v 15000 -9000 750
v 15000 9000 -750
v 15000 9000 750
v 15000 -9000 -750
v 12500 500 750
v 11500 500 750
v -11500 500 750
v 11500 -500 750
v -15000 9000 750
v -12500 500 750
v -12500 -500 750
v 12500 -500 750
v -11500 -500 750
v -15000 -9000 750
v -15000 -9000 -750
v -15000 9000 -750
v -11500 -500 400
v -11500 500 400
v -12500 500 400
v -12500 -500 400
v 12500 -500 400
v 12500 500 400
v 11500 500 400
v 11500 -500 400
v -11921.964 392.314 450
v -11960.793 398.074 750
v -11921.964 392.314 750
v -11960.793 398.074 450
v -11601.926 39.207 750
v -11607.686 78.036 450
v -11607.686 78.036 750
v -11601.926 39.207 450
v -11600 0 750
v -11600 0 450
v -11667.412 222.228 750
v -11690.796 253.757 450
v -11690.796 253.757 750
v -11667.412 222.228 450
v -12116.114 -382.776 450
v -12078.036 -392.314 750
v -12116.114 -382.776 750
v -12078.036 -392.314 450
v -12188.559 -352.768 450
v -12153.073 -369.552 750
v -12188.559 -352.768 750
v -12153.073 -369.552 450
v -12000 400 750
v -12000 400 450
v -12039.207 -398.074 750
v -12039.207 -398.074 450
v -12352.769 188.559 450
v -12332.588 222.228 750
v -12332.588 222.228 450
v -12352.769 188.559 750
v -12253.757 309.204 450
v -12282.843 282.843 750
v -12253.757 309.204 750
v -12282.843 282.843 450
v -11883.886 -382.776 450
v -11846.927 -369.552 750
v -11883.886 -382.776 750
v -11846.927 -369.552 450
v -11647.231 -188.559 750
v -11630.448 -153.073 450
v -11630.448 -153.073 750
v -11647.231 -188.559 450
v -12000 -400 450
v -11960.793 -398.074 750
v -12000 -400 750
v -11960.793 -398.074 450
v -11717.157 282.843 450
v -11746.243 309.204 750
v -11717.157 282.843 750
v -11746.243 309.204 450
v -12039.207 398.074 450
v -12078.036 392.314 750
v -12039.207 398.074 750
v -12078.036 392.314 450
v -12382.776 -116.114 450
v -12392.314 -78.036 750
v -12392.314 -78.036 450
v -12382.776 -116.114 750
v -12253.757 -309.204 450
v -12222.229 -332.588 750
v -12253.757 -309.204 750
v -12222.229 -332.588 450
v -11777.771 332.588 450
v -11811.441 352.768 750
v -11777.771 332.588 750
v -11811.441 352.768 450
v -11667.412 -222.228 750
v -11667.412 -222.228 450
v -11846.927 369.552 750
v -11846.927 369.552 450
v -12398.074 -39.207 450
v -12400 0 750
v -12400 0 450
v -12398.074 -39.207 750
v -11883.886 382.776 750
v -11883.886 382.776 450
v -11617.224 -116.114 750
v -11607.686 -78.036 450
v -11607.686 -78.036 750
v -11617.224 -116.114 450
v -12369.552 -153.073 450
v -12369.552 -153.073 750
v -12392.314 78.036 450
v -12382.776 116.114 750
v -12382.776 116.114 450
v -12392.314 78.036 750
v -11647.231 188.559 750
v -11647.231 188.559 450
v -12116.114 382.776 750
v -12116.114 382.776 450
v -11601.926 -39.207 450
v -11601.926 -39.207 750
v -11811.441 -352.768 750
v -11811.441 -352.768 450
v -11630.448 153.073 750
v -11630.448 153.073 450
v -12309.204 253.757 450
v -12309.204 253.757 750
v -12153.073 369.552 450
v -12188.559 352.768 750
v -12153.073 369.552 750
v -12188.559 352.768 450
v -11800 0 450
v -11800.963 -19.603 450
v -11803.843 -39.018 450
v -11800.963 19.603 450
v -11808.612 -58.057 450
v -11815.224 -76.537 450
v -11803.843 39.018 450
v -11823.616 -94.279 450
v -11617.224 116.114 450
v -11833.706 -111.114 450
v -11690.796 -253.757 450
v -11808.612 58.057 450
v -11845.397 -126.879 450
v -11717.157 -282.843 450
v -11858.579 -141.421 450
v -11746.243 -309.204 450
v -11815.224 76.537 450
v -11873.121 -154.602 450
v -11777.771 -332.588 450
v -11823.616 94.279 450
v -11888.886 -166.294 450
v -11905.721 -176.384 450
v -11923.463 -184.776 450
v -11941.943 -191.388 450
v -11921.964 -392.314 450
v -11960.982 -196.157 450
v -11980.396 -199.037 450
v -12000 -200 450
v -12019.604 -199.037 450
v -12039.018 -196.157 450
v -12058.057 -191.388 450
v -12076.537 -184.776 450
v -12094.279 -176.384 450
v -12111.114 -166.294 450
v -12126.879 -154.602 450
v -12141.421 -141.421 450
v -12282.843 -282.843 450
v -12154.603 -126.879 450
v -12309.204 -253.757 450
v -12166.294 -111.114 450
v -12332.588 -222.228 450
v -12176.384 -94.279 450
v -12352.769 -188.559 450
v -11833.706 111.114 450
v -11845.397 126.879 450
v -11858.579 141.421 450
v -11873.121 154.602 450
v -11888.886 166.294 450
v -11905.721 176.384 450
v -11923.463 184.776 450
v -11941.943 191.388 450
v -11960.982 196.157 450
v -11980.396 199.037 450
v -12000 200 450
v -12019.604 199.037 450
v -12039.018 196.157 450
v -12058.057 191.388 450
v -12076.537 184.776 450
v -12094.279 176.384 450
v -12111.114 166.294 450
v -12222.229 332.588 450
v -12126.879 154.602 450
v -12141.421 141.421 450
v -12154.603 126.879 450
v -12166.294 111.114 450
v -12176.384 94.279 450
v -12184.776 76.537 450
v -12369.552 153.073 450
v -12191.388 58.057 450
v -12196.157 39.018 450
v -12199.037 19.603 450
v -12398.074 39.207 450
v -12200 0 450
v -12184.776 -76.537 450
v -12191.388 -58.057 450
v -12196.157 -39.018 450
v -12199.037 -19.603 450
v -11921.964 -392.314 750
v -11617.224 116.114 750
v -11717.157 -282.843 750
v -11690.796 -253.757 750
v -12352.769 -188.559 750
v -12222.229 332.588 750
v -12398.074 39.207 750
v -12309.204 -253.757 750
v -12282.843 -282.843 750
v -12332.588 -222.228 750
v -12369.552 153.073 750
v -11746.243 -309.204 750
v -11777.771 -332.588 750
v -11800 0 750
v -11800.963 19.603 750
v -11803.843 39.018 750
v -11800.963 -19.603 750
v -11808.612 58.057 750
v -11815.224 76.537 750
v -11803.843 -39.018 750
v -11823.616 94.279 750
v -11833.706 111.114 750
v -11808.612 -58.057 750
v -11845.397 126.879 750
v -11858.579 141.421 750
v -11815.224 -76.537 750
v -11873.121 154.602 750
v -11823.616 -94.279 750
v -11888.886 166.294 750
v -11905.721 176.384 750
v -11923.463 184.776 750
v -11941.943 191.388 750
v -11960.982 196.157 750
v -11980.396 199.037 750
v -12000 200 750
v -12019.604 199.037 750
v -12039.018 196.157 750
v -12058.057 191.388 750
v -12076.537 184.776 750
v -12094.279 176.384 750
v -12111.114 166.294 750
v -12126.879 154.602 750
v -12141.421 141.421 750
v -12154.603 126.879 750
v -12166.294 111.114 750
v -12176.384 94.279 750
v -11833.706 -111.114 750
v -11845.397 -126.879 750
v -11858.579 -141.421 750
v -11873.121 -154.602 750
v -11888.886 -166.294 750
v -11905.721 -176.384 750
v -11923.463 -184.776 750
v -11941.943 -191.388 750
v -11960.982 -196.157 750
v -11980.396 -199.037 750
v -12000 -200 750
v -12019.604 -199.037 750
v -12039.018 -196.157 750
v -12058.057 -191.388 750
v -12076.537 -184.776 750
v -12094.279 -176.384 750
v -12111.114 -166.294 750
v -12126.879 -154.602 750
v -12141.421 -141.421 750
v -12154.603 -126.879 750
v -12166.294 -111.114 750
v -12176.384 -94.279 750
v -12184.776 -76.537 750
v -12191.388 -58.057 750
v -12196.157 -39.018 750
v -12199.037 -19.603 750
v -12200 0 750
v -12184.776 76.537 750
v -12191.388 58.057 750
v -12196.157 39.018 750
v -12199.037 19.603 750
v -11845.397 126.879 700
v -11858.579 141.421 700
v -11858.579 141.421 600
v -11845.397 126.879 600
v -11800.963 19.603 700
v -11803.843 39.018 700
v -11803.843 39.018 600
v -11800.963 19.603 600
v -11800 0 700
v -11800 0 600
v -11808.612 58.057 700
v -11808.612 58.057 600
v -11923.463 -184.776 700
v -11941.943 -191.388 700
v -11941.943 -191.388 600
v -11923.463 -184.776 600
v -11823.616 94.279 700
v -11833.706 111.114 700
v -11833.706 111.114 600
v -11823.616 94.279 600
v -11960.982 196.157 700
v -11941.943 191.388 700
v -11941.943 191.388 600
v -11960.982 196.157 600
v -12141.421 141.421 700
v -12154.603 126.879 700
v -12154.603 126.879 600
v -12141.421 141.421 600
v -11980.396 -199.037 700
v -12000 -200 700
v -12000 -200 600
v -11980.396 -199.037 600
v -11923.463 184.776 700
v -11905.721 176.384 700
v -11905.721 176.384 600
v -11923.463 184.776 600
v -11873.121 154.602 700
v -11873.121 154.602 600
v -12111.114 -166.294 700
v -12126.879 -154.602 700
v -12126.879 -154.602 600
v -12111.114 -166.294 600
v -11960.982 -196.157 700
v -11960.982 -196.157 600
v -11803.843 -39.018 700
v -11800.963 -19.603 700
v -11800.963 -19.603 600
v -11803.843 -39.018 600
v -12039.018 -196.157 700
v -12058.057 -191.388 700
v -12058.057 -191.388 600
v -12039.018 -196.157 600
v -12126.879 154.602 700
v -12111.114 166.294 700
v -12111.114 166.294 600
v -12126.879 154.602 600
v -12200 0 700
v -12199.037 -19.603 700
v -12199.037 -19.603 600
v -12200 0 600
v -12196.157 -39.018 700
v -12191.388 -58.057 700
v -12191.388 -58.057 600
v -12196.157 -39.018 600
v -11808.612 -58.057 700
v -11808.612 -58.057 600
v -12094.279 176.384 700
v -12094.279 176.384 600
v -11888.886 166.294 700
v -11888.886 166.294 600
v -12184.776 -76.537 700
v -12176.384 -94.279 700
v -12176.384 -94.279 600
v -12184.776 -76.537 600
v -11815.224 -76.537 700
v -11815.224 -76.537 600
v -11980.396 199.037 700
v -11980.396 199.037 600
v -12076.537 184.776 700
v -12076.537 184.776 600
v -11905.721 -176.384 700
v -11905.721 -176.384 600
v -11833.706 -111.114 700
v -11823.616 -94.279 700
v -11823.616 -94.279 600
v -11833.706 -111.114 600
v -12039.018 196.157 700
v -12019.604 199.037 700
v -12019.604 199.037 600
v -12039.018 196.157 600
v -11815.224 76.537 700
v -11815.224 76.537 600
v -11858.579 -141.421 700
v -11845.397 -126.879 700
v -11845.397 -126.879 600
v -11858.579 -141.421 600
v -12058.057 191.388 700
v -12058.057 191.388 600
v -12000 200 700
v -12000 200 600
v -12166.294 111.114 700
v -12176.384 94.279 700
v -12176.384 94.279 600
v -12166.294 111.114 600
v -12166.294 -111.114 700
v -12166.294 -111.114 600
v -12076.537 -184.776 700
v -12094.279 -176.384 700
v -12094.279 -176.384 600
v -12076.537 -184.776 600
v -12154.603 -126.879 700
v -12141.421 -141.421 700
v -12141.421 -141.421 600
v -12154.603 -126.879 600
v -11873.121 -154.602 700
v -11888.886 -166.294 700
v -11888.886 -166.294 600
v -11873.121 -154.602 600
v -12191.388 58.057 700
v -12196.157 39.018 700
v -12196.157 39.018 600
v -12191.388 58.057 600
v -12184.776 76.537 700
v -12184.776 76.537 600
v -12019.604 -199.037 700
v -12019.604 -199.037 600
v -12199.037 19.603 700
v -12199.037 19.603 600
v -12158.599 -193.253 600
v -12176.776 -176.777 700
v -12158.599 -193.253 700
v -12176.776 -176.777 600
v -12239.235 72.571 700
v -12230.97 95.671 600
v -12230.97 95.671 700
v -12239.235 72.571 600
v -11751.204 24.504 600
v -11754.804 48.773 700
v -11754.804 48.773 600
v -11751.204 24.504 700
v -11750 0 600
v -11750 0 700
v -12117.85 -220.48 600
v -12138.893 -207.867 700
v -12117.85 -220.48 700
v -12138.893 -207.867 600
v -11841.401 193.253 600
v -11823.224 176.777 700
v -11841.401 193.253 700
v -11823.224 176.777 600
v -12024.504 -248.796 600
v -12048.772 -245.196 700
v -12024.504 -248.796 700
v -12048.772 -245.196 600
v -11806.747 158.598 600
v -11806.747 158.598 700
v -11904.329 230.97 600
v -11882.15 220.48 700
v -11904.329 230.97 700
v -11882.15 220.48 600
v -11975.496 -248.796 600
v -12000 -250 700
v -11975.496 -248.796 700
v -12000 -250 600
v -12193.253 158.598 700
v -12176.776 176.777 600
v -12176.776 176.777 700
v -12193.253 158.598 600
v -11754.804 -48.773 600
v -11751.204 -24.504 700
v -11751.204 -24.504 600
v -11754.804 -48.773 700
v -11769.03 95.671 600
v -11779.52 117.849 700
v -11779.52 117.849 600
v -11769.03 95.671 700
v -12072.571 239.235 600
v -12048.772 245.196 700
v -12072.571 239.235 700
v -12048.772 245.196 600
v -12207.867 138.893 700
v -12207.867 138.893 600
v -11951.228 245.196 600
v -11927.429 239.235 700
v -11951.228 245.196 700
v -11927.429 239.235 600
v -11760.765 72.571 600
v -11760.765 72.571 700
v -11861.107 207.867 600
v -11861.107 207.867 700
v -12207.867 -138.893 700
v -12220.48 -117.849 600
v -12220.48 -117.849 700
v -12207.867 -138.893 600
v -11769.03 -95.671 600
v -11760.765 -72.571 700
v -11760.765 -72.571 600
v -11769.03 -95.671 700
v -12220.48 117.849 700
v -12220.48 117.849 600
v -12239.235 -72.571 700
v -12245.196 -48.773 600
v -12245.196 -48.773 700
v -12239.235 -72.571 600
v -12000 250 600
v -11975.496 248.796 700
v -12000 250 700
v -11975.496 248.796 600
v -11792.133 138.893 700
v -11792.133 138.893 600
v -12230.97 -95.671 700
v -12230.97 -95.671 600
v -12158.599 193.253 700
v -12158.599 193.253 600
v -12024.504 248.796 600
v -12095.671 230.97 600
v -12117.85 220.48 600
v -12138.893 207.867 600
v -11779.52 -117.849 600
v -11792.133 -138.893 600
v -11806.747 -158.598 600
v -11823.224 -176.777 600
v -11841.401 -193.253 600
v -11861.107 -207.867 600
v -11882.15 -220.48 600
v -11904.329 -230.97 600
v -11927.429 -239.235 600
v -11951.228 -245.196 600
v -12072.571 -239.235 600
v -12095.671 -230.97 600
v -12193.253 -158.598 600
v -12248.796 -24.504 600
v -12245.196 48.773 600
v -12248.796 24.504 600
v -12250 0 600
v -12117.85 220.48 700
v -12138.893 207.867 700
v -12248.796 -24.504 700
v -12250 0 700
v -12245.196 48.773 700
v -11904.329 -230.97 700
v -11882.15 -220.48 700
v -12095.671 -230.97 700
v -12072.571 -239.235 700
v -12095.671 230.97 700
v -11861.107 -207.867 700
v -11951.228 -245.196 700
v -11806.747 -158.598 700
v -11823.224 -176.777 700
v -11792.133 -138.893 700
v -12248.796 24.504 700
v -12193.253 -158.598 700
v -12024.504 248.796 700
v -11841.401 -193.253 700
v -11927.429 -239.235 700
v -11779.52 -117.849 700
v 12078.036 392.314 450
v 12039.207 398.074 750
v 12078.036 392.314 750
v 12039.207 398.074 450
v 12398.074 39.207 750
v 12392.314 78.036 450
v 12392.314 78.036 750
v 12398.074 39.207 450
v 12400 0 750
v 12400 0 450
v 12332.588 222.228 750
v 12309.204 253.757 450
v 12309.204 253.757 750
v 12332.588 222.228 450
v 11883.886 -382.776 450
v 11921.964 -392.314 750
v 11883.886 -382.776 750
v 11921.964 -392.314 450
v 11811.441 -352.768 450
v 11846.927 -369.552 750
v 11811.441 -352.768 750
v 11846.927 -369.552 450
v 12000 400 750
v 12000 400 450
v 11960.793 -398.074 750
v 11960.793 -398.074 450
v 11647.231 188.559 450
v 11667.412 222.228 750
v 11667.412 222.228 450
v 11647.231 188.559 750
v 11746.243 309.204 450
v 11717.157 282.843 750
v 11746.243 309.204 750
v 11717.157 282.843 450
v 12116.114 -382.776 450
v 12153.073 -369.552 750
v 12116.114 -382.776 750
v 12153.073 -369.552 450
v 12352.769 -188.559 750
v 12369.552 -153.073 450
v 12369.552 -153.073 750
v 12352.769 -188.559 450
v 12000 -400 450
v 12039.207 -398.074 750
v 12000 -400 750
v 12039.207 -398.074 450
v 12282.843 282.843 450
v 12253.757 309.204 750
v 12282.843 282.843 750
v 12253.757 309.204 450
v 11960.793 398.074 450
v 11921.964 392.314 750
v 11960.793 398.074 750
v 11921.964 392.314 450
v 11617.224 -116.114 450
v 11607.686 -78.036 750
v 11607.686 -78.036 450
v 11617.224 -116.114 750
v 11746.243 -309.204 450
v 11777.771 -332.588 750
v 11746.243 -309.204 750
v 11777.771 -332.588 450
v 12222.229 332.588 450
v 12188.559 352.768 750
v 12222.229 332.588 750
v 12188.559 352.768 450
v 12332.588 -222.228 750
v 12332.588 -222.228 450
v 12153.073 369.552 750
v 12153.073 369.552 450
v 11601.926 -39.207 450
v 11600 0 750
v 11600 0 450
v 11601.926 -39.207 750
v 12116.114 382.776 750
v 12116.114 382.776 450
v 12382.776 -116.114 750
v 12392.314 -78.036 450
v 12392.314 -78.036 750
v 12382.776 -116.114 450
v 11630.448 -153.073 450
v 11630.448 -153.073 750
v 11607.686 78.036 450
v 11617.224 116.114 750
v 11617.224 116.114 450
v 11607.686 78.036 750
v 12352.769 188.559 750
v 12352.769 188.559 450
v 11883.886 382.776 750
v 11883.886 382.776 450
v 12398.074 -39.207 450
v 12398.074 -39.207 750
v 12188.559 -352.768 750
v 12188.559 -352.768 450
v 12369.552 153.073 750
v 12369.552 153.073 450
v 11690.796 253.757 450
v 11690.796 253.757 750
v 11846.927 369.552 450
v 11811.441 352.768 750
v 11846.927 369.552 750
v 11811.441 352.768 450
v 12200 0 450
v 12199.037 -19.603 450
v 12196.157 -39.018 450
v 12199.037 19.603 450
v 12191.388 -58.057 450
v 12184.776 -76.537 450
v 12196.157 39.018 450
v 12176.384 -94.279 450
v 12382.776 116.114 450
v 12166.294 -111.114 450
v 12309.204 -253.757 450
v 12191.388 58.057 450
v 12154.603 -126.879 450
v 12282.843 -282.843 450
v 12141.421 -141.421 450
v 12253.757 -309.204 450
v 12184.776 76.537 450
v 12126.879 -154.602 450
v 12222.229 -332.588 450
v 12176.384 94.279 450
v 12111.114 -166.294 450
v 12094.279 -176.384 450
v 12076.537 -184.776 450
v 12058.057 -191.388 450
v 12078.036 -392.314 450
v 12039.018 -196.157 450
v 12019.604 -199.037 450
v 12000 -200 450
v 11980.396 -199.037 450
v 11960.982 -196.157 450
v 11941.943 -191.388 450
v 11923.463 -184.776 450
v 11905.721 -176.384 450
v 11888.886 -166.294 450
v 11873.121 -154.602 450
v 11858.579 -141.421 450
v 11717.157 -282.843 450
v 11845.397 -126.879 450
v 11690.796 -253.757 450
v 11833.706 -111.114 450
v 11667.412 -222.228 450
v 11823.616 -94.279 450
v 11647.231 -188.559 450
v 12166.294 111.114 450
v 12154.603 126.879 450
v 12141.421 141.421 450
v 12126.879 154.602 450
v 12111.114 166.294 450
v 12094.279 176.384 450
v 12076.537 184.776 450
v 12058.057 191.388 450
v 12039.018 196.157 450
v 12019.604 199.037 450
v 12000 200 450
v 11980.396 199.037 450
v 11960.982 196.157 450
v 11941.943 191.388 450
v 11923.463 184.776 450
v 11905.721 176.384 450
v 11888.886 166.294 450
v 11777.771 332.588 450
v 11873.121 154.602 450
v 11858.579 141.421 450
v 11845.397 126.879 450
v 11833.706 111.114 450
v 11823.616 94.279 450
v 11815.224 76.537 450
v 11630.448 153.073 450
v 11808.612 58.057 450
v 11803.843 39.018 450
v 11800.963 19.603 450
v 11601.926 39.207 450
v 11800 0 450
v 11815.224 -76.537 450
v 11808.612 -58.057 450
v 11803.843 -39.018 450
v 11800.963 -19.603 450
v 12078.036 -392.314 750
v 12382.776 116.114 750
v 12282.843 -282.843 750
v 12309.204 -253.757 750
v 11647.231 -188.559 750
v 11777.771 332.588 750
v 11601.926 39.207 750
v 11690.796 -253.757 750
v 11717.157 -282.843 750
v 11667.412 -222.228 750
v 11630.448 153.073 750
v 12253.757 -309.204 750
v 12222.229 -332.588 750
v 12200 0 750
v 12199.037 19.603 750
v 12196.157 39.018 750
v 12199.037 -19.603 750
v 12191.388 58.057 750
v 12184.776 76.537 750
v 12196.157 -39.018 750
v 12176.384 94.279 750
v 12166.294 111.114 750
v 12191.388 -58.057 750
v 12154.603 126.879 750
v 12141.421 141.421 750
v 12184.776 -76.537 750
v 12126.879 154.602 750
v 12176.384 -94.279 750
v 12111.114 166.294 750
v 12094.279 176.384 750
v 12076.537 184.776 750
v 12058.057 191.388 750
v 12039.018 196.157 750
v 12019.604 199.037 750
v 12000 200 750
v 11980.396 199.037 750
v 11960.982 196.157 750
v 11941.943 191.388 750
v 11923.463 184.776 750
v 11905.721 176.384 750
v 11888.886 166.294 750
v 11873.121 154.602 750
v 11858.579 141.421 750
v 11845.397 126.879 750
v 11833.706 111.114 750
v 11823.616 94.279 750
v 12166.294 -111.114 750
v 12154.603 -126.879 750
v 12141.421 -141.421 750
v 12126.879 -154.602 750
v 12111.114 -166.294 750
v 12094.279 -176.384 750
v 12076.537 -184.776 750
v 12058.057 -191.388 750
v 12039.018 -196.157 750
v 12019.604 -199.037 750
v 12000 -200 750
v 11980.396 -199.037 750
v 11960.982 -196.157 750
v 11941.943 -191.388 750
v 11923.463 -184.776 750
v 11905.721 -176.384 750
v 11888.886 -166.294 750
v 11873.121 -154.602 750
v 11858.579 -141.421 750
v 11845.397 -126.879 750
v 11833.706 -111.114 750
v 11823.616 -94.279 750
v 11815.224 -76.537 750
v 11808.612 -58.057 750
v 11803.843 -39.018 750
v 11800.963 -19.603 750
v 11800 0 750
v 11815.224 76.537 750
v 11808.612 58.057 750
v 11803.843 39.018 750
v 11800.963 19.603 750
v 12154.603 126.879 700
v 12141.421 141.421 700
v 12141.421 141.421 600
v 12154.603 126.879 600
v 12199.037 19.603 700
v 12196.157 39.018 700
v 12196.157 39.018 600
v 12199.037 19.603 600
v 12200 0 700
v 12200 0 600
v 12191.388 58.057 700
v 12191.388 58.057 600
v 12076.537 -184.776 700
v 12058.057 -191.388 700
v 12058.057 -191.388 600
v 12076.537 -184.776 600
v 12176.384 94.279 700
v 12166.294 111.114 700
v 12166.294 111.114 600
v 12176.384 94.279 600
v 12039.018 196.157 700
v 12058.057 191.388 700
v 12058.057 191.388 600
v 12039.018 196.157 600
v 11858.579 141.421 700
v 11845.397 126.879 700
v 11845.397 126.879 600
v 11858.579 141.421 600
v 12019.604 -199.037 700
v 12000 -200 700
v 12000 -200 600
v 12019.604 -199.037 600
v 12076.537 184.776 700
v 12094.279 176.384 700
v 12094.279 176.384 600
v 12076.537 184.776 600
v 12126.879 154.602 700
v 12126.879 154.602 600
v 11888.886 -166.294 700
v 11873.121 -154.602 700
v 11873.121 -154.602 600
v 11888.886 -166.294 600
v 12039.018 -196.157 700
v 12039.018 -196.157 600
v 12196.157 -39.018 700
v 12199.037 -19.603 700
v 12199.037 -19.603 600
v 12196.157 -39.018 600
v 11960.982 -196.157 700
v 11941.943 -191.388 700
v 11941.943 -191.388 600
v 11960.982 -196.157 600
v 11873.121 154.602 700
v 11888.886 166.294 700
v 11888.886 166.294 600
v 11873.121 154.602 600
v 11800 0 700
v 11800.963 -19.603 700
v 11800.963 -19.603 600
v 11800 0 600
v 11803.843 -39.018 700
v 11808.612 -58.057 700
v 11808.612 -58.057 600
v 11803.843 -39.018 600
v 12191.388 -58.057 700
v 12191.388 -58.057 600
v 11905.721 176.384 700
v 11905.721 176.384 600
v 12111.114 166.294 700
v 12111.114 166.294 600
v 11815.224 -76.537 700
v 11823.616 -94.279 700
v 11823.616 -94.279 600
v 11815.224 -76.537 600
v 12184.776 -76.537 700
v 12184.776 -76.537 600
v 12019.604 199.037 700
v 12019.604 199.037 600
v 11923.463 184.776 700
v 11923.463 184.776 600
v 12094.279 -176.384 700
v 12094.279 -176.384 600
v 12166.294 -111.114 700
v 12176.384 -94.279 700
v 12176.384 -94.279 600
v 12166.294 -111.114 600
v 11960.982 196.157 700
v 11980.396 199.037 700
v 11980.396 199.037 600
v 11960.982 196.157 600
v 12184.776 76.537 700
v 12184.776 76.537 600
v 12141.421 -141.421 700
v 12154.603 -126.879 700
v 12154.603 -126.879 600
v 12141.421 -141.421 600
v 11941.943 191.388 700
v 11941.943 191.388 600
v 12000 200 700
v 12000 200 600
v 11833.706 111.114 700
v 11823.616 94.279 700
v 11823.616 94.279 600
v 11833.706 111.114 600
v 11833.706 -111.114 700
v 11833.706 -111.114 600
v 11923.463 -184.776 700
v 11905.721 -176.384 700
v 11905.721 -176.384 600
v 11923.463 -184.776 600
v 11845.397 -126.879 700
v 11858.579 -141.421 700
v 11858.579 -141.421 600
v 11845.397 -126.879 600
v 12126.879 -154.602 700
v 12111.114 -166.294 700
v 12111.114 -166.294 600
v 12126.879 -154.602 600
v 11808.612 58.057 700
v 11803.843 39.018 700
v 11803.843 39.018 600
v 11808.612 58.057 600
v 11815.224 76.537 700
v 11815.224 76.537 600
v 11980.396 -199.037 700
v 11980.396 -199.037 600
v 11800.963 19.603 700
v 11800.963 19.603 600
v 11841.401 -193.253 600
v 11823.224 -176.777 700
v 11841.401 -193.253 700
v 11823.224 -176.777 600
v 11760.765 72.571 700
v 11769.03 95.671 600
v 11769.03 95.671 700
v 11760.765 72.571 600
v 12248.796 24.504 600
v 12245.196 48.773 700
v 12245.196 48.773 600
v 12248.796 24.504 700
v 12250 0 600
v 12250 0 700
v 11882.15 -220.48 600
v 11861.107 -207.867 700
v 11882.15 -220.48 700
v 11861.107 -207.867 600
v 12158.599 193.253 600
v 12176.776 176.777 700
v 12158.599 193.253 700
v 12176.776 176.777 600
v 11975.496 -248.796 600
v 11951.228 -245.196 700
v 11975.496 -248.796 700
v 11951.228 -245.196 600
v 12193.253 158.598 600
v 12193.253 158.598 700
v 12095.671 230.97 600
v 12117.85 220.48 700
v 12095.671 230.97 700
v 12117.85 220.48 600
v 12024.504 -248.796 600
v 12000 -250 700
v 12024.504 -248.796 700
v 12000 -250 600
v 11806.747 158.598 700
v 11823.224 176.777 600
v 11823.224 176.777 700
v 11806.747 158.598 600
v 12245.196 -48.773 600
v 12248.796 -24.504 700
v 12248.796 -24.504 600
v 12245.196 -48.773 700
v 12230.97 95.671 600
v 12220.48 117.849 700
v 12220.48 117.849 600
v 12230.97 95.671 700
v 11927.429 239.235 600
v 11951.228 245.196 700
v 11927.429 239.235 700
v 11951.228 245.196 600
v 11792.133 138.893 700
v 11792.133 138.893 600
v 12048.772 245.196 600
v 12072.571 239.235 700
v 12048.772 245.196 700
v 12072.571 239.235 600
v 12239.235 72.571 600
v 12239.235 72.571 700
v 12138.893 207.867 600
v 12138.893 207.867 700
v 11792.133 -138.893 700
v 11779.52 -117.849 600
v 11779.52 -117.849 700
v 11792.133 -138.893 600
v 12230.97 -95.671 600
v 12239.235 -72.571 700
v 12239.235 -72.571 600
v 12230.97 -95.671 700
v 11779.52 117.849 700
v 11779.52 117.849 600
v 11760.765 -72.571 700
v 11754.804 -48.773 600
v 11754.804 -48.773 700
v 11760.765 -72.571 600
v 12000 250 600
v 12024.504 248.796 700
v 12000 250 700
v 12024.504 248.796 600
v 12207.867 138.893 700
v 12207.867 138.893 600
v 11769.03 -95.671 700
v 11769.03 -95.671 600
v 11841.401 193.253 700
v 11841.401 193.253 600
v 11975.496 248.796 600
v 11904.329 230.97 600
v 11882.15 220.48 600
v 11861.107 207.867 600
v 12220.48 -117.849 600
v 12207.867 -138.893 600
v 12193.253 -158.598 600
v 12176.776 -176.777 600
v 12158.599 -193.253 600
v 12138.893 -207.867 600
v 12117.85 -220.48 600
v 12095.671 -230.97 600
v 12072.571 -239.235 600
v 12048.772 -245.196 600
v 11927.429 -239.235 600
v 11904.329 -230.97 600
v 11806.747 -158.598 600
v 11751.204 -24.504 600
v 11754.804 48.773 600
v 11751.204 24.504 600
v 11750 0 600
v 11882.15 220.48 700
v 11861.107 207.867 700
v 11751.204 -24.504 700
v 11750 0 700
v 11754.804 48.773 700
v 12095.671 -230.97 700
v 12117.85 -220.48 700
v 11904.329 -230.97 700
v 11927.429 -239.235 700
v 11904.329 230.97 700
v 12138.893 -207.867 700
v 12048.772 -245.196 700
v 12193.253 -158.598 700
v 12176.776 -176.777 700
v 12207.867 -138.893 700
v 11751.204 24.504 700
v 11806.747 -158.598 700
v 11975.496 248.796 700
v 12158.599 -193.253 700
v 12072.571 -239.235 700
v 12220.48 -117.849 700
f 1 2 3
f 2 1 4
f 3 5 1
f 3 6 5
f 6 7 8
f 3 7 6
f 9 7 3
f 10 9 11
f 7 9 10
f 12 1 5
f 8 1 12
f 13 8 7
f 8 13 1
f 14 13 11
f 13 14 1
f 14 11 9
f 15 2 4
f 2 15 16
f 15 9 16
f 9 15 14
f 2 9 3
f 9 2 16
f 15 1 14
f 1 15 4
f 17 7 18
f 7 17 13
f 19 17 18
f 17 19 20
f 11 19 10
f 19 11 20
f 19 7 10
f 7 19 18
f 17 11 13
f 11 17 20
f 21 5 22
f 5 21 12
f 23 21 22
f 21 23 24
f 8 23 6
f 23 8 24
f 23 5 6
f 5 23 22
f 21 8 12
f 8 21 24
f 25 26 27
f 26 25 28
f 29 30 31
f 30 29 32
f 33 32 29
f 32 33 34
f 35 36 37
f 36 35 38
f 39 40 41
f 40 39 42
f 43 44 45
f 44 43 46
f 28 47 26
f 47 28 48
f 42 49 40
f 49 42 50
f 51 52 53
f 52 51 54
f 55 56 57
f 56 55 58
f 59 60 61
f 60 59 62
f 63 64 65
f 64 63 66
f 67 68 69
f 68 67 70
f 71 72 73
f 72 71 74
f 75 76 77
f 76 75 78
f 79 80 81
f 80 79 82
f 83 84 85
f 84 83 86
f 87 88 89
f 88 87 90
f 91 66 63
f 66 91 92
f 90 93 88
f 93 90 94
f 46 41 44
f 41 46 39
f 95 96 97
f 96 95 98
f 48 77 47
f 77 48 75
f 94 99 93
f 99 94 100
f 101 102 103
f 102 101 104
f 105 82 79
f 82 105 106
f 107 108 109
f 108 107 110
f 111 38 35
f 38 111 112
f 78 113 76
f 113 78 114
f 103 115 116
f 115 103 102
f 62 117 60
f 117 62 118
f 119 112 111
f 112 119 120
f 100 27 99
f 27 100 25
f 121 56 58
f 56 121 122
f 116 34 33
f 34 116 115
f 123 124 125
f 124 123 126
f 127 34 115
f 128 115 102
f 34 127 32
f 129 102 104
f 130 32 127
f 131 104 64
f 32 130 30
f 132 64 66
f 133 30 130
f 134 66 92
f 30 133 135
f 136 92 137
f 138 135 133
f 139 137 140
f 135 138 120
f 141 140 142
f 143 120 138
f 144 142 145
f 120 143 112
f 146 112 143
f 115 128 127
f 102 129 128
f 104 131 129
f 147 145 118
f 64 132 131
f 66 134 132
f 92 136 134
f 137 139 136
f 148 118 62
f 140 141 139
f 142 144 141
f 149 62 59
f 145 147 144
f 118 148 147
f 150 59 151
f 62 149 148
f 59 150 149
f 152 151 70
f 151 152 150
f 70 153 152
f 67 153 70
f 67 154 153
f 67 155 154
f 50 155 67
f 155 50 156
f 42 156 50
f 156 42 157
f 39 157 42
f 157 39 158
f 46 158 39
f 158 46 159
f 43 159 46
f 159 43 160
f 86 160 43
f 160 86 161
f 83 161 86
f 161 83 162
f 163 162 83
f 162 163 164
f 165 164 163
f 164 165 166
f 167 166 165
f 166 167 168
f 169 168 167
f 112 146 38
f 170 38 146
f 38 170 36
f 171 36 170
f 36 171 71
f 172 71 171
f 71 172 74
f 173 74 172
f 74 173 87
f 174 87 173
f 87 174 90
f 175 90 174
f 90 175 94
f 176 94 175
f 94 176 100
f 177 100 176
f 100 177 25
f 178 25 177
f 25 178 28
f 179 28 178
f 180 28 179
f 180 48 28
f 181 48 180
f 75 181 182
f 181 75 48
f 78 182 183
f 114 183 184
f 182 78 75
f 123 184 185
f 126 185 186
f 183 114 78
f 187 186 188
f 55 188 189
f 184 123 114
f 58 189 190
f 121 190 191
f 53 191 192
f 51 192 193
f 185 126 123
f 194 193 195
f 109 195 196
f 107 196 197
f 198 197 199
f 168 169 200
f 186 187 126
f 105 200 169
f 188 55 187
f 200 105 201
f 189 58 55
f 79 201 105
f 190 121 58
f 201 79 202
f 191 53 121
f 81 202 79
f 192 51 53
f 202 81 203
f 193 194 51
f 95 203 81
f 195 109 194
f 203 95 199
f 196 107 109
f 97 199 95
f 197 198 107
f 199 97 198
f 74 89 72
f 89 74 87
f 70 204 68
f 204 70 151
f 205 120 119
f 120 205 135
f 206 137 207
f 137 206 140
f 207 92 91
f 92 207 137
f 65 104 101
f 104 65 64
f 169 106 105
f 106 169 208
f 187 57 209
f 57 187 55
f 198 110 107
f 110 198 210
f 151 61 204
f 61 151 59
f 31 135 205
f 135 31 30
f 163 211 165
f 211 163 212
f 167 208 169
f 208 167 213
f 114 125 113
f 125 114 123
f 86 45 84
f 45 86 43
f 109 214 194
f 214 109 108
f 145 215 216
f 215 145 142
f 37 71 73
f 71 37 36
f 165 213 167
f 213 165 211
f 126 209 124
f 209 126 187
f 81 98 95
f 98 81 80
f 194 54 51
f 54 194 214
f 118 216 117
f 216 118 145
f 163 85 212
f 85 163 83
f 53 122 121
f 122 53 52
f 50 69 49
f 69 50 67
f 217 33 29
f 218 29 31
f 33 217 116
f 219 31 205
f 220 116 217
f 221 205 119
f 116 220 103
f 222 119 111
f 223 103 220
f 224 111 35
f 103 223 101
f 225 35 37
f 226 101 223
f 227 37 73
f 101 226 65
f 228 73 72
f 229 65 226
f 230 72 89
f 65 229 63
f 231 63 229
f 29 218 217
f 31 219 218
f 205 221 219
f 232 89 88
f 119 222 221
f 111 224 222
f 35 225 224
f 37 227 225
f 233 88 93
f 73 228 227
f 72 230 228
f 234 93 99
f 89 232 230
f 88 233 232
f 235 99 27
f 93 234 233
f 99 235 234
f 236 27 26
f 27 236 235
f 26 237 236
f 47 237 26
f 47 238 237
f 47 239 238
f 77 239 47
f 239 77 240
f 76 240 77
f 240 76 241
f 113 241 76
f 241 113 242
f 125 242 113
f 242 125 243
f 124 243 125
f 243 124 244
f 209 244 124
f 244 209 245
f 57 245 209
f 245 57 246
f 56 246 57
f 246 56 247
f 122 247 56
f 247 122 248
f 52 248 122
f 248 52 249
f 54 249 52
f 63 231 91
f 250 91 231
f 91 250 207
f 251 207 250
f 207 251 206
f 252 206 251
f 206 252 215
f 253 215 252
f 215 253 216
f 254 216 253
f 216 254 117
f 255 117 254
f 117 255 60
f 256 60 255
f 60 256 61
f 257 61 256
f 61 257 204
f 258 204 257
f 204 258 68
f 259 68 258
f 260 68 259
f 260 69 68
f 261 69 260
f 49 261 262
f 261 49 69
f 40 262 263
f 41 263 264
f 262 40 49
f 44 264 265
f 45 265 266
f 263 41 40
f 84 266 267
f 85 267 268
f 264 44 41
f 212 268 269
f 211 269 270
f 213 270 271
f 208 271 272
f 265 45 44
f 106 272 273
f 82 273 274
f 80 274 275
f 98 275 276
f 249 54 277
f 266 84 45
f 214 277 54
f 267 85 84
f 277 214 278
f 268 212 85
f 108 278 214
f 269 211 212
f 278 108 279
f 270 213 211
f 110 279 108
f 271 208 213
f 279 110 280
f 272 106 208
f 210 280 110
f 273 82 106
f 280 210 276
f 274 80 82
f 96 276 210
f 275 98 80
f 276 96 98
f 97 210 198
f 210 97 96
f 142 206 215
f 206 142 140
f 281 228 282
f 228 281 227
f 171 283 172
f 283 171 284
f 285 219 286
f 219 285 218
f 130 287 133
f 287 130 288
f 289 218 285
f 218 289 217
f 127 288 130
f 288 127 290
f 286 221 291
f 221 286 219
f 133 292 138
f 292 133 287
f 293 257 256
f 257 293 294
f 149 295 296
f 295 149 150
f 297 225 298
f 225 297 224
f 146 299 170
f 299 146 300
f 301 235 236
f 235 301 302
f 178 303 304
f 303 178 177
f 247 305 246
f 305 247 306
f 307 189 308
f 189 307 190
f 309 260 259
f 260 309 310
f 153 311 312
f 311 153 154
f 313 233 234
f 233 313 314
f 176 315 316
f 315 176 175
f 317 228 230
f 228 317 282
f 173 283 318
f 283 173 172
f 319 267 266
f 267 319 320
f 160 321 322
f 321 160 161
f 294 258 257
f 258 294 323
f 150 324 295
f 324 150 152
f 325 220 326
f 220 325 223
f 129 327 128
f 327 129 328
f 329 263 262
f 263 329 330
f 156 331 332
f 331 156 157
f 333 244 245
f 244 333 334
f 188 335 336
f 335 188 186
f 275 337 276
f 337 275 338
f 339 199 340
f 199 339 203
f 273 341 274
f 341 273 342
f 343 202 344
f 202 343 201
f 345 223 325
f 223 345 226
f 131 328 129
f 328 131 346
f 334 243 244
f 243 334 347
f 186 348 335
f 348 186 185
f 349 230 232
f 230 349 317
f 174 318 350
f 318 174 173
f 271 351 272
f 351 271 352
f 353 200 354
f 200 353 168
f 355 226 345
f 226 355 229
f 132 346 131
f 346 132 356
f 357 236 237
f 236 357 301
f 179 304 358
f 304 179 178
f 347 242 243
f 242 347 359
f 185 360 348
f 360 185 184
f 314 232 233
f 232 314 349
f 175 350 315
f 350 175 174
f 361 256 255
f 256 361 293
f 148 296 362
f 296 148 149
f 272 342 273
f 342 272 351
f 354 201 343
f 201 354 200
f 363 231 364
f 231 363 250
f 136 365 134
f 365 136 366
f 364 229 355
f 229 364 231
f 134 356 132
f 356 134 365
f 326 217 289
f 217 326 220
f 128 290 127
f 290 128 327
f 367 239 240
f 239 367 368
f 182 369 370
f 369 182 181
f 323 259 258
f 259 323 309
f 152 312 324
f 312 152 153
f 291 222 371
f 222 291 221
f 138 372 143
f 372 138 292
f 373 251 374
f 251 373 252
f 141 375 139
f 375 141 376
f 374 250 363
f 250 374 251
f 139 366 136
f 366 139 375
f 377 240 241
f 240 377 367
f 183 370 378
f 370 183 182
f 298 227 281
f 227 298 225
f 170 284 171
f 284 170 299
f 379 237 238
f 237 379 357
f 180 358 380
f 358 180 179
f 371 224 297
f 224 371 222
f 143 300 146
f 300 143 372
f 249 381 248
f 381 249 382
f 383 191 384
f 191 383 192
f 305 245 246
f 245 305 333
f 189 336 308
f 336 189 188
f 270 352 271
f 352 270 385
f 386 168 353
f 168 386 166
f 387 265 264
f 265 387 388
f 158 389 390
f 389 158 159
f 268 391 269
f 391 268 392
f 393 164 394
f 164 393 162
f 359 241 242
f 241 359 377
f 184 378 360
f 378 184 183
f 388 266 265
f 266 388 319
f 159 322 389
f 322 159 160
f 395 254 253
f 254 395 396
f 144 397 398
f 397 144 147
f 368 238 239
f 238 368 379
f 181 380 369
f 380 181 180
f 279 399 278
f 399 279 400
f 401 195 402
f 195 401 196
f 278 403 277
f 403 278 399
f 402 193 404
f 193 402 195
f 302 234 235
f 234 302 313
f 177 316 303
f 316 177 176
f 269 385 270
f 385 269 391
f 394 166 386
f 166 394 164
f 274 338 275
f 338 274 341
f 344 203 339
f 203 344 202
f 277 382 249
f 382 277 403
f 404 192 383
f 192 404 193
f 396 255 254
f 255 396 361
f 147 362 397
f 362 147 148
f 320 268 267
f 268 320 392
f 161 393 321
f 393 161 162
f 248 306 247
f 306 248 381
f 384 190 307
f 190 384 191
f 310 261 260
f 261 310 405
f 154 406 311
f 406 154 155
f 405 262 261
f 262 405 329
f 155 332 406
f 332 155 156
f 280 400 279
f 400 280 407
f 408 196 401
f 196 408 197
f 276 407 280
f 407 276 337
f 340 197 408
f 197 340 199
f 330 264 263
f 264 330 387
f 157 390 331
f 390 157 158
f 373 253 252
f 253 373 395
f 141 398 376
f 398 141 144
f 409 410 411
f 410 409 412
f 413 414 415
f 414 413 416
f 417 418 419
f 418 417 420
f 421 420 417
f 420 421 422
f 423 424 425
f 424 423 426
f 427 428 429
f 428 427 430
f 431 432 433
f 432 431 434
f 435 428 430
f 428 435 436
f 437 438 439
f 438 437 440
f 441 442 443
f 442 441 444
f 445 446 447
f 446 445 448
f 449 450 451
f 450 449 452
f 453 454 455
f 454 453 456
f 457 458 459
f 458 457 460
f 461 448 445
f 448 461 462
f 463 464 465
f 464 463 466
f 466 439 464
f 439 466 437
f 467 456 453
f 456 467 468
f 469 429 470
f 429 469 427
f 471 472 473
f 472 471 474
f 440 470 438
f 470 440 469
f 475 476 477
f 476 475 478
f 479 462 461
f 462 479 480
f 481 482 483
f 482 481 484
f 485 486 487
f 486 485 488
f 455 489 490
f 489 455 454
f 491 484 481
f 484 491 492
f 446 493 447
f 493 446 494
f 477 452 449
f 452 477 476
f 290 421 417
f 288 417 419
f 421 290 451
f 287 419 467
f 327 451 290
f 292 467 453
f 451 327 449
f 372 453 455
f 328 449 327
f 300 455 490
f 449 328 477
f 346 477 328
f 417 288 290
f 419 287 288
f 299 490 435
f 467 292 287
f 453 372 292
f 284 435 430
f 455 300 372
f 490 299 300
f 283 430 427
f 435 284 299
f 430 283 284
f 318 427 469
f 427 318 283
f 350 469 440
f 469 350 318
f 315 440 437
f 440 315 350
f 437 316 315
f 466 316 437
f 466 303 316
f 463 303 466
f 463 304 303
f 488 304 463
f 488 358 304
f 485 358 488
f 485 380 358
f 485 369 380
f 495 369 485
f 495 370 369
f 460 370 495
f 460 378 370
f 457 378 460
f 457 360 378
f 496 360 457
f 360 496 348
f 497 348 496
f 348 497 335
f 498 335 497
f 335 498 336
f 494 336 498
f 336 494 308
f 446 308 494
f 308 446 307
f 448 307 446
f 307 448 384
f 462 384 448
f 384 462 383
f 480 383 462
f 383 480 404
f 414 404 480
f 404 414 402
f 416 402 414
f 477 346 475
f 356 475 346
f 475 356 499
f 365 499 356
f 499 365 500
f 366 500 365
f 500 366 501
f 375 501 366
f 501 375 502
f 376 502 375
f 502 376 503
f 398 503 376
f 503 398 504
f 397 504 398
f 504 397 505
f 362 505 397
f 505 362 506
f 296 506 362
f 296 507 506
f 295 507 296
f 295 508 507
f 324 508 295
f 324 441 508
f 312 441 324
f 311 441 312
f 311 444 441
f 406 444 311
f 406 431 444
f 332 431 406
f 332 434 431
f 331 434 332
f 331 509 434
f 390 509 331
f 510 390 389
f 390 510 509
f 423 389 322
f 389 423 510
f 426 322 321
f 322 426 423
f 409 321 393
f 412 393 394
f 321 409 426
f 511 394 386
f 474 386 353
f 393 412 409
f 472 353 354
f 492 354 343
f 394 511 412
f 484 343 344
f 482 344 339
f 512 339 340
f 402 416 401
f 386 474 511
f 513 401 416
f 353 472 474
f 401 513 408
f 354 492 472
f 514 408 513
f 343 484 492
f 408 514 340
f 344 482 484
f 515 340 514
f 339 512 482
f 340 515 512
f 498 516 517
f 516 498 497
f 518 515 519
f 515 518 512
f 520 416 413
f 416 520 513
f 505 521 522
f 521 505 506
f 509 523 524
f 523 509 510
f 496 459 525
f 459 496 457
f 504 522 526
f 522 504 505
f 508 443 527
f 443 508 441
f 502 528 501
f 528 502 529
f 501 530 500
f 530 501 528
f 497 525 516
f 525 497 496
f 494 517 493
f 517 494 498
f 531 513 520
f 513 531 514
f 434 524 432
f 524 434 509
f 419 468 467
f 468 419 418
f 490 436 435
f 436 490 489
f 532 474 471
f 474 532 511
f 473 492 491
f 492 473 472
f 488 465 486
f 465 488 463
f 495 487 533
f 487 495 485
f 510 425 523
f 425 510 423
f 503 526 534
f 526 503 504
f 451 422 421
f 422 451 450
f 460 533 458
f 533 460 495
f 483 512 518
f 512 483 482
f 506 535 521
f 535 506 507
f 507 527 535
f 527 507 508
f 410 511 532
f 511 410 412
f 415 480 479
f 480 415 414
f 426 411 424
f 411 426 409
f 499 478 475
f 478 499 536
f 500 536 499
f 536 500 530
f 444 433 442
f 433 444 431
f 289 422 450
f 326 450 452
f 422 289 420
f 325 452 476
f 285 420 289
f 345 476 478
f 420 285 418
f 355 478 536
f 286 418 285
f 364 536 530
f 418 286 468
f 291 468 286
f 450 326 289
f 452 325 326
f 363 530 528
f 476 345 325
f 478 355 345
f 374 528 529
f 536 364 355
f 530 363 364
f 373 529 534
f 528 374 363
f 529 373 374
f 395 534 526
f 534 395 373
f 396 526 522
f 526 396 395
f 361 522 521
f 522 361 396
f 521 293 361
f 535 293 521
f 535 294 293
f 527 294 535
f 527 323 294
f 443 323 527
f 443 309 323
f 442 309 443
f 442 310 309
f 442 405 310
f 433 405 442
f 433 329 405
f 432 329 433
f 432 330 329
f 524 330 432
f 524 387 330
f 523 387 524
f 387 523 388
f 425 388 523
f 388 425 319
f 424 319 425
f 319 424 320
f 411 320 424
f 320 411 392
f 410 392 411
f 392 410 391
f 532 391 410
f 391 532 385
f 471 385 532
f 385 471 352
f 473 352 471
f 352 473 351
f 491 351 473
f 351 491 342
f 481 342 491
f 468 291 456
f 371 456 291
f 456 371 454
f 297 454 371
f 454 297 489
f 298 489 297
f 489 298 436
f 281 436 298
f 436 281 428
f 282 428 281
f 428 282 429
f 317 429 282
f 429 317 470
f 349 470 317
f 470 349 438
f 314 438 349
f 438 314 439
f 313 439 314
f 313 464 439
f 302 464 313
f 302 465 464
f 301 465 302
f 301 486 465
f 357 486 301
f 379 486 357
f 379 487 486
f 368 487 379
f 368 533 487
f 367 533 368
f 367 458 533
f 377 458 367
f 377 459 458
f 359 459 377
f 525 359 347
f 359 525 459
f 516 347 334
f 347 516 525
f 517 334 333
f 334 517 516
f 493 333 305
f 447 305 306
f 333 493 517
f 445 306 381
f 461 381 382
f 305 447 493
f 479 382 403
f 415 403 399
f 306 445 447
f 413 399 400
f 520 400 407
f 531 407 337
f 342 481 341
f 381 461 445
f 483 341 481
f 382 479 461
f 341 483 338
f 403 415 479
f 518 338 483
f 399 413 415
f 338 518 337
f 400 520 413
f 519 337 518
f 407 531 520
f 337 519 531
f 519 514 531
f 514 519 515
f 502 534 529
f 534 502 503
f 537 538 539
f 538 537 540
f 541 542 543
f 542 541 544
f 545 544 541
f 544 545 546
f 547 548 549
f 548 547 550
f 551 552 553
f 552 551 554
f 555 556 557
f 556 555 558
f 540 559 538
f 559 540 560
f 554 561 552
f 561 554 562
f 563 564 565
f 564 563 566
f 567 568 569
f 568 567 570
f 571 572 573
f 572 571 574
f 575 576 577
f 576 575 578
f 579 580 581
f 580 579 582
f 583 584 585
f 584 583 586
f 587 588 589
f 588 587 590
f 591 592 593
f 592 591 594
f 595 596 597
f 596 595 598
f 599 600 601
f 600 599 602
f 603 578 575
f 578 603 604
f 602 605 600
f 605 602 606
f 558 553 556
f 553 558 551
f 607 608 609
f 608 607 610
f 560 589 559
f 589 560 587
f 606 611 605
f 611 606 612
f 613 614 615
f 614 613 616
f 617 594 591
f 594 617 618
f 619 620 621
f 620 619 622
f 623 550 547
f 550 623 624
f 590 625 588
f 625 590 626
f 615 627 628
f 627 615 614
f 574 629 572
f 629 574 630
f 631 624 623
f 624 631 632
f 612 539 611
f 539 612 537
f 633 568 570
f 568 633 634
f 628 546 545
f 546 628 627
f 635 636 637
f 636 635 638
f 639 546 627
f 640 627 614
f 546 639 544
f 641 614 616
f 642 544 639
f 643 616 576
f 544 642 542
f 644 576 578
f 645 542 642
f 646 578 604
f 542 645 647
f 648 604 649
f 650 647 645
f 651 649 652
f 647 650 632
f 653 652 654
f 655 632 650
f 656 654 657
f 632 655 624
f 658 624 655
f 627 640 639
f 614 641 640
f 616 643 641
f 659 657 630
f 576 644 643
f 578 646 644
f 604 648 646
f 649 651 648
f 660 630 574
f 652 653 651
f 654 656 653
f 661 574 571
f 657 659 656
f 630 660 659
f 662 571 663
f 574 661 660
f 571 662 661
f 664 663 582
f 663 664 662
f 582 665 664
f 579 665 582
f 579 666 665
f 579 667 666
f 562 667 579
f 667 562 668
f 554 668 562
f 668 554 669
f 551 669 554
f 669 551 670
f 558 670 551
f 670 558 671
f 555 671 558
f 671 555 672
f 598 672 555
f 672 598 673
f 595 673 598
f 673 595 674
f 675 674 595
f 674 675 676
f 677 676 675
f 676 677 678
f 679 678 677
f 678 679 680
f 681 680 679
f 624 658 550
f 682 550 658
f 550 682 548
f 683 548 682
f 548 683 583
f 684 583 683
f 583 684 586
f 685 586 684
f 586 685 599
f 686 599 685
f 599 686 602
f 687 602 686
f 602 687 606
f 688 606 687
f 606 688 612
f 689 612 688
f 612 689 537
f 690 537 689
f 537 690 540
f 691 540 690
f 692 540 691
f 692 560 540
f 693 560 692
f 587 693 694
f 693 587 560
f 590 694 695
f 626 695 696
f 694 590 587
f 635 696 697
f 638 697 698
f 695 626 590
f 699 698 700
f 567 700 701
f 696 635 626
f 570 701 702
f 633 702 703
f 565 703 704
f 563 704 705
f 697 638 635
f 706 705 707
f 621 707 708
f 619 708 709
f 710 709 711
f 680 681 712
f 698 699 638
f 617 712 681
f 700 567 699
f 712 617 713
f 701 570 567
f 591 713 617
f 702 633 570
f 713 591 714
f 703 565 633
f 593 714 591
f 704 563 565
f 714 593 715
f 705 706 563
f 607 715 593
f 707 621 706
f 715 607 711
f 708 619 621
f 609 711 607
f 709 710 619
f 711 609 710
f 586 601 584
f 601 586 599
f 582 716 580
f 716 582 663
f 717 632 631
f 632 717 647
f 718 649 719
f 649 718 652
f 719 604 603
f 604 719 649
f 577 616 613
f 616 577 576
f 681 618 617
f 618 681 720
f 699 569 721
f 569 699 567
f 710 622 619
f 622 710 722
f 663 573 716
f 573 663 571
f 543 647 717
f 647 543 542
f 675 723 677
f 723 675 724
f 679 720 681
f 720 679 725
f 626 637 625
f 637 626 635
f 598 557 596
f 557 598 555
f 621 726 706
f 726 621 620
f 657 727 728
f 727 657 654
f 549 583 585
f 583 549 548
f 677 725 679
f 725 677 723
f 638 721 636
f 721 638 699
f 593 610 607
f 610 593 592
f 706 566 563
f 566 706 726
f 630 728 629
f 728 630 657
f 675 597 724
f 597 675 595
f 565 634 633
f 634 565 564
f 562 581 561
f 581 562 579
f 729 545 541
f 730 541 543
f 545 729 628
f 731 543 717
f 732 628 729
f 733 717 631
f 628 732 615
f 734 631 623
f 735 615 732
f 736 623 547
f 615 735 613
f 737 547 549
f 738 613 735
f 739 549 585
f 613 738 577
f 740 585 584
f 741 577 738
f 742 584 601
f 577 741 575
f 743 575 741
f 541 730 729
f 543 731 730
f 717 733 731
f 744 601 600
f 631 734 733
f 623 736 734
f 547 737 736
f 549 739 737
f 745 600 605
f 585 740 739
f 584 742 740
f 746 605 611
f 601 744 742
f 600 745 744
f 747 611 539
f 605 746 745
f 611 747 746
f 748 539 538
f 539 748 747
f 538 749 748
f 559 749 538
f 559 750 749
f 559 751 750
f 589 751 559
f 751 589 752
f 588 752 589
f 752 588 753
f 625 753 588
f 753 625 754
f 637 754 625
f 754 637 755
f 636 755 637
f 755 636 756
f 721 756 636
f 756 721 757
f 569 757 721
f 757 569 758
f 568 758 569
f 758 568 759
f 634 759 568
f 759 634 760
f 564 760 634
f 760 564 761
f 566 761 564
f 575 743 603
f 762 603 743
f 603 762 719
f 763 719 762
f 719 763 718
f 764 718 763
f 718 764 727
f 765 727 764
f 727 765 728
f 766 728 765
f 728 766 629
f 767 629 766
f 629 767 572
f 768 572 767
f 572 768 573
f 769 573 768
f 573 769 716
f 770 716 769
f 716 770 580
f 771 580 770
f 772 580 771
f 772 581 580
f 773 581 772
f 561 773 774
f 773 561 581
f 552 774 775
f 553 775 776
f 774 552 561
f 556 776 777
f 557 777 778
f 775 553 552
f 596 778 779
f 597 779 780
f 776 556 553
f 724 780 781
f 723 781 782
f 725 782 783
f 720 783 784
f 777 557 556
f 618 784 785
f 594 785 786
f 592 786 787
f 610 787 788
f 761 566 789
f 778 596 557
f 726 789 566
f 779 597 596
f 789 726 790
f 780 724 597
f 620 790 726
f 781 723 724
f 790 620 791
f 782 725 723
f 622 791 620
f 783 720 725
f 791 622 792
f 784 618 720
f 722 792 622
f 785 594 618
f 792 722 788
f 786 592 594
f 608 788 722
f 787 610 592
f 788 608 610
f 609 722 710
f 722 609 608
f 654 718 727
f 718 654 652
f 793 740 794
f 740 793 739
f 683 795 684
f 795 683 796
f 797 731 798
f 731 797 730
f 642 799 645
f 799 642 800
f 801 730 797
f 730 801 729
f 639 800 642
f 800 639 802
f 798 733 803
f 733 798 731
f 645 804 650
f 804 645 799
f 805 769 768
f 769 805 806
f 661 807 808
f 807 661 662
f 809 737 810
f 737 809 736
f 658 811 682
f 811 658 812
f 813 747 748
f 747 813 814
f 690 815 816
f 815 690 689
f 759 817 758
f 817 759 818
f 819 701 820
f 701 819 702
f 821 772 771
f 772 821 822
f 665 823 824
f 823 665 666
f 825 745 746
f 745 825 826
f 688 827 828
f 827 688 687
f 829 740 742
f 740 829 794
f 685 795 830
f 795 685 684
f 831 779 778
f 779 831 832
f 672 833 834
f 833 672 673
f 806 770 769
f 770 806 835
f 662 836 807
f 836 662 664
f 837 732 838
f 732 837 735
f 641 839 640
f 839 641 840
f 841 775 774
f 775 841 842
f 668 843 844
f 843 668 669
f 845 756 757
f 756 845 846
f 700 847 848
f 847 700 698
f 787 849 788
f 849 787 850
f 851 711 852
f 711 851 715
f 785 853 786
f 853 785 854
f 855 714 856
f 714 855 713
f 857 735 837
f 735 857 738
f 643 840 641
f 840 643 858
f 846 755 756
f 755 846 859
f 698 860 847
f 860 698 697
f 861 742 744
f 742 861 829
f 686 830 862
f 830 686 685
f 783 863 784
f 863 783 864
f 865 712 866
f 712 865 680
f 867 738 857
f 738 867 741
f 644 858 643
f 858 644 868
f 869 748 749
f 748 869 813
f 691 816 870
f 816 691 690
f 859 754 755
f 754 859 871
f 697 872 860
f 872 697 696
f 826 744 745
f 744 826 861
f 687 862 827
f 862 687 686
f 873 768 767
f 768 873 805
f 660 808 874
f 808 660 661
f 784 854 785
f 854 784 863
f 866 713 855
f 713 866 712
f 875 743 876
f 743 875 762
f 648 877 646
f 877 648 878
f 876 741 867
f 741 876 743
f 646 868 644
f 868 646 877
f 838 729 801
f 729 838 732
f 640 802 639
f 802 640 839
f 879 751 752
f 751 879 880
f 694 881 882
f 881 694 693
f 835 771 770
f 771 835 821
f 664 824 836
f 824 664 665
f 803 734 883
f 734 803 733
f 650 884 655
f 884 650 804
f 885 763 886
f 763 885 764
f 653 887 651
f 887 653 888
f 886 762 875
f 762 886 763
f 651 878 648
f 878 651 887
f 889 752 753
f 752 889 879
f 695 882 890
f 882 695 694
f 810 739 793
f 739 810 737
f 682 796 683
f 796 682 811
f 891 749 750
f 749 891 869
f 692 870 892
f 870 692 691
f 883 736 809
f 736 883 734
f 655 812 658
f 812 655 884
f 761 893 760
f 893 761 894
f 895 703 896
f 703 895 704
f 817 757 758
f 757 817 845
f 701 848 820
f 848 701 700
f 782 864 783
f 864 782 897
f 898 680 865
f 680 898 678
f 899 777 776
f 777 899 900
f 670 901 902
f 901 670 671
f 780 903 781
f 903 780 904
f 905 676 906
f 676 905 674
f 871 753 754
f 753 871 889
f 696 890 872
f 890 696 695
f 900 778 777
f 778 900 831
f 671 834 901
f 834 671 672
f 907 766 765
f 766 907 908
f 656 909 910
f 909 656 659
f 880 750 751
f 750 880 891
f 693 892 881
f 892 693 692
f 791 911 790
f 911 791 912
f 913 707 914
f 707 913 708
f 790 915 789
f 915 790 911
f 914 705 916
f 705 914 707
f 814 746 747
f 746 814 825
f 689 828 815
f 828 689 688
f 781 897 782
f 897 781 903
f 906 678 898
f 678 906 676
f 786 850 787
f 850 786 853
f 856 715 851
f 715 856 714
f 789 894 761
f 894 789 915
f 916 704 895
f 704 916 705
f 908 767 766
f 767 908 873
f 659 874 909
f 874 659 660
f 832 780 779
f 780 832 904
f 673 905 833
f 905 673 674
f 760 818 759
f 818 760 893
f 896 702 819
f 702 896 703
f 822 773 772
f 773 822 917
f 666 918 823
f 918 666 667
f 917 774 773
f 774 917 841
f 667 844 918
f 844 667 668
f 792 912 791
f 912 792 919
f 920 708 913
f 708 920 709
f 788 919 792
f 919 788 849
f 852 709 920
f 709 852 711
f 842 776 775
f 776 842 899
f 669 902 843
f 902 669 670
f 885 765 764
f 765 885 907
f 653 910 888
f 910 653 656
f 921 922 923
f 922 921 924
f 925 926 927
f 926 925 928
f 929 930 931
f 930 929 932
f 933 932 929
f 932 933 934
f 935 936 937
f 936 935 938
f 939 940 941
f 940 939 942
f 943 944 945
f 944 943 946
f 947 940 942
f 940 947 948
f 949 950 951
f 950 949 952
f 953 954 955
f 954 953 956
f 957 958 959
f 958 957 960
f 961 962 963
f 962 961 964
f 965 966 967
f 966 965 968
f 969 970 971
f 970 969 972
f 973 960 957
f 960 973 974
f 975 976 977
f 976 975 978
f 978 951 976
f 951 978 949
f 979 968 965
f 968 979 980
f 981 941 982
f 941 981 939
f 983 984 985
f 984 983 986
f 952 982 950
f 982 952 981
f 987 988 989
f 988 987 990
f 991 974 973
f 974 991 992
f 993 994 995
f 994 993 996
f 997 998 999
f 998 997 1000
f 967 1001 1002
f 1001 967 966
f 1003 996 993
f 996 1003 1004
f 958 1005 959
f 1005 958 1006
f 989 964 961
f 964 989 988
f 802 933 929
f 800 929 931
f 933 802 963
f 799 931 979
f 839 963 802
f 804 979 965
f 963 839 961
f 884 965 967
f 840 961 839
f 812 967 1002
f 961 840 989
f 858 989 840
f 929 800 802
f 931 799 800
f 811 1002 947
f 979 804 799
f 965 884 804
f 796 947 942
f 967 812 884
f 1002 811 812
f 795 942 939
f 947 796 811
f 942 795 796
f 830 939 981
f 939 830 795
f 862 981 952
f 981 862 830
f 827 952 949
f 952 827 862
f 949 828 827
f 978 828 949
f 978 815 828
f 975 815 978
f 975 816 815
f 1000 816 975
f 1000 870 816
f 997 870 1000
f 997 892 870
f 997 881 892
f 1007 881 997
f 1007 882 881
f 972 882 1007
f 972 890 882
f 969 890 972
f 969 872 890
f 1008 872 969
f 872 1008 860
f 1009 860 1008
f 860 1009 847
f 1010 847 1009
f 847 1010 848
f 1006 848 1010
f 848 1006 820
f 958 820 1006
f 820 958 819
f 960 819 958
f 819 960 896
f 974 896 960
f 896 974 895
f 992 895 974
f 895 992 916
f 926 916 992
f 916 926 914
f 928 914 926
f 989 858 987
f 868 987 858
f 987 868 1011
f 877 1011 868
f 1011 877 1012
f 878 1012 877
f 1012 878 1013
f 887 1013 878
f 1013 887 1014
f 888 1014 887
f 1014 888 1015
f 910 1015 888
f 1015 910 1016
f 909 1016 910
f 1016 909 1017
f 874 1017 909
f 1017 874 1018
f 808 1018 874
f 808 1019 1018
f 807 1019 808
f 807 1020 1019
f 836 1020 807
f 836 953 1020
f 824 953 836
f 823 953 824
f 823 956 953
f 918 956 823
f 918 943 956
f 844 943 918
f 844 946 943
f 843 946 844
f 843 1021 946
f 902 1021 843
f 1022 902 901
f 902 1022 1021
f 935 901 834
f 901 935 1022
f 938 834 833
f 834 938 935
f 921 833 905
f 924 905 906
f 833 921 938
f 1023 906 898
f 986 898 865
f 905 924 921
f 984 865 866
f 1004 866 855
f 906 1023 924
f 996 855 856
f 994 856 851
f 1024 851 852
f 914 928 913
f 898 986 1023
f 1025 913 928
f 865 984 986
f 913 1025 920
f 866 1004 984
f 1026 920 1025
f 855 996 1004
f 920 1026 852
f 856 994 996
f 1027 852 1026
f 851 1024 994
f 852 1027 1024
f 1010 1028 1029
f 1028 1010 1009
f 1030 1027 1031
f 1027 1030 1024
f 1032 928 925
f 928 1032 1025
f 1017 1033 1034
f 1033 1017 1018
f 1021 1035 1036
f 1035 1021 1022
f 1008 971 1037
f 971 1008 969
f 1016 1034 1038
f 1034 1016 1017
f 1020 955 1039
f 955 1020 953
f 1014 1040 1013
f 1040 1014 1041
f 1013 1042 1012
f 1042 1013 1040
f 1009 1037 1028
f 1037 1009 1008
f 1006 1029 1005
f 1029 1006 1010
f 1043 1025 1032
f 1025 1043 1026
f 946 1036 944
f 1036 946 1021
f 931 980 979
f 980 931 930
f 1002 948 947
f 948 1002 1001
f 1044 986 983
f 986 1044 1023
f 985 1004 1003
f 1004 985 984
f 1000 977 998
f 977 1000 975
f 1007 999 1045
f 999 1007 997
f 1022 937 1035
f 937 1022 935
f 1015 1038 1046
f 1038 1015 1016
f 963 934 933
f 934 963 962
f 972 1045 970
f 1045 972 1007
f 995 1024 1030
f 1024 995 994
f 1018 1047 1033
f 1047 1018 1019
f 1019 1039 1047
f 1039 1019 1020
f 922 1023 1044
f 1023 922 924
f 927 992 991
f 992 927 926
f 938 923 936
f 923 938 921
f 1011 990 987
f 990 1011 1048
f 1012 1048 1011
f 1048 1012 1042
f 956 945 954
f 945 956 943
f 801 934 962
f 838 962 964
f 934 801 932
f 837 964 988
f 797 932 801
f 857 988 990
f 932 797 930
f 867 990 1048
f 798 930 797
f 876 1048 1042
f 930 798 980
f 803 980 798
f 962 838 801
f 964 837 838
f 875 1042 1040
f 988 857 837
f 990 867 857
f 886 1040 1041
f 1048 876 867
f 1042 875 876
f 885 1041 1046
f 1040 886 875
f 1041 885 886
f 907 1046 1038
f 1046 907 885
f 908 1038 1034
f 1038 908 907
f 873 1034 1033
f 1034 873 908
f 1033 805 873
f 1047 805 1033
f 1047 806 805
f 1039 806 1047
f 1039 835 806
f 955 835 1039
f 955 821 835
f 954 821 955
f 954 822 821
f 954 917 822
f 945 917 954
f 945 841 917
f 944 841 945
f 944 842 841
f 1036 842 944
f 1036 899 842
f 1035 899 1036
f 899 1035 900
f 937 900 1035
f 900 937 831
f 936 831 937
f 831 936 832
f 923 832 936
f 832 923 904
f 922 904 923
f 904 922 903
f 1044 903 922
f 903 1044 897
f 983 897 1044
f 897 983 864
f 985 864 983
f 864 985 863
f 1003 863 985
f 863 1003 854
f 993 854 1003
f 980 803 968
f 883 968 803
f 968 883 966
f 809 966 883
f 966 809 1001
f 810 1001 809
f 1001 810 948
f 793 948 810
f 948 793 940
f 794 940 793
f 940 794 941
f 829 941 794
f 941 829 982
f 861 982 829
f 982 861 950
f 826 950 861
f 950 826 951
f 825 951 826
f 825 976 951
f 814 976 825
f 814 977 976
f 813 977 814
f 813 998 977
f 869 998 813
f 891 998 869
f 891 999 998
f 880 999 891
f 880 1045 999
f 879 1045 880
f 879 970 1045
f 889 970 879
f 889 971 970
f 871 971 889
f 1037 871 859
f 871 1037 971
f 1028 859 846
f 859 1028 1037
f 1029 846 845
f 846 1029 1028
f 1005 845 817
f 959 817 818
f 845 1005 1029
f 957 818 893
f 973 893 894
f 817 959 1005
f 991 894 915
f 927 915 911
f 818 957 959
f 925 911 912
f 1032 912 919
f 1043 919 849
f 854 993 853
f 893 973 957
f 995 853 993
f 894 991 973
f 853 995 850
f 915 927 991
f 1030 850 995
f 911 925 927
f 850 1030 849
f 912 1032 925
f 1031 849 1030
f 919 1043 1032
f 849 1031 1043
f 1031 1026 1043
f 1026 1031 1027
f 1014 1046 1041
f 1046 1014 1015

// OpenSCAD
// =========================================================================
// GRUMMAN-STYLED INFLATABLE CARRIER - VACUUM EVACUATION PORT Blueprints
// MANUFACTURER: HUNTINGTON INGALLS / NEWPORT NEWS SHIPBUILDING
// MATERIAL SPECIFICATION: TITANIUM GRADE 5 NON-RETURN FLUSH VALVES
// =========================================================================

module titanium_vacuum_port(outer_r=400, bore_r=200, flange_t=50) {
    // Flush-deck suction evacuation port with an internal non-return check ledge
    difference() {
        // Main Valve Housing Block Outer Shell
        cylinder(h=300, r=outer_r, center=true, $fn=64);
        
        // Central Bore Cavity for Vacuum Hose Coupling Extraction
        cylinder(h=320, r=bore_r, center=true, $fn=64);
        
        // Internal Shoulder Cut for One-Way Sealing Gasket Seating
        translate([0, 0, 50])
            cylinder(h=100, r=bore_r + 50, center=true, $fn=64);
    }
}

module carrier_plate_with_vacuum_ports() {
    difference() {
        // Core Grade 5 Titanium Flatbed Hinge Plate (30m x 18m x 1.5m)
        cube([30000, 18000, 1500], center=true);
        
        // Subtract Placement Pockets for Dual Non-Return Evacuation Valves
        translate([-12000, 0, 1500/2 - 150]) rotate([0,0,0]) cube([1000, 1000, 400], center=true);
        translate([12000, 0, 1500/2 - 150])  rotate([0,0,0]) cube([1000, 1000, 400], center=true);
    }
    
    // Seat the flush titanium vacuum ports inside the processed placement wells
    translate([-12000, 0, 1500/2 - 150]) titanium_vacuum_port();
    translate([12000, 0, 1500/2 - 150])  titanium_vacuum_port();
}

// Render structural segment with integrated vacuum evacuation interfaces
carrier_plate_with_vacuum_ports();
